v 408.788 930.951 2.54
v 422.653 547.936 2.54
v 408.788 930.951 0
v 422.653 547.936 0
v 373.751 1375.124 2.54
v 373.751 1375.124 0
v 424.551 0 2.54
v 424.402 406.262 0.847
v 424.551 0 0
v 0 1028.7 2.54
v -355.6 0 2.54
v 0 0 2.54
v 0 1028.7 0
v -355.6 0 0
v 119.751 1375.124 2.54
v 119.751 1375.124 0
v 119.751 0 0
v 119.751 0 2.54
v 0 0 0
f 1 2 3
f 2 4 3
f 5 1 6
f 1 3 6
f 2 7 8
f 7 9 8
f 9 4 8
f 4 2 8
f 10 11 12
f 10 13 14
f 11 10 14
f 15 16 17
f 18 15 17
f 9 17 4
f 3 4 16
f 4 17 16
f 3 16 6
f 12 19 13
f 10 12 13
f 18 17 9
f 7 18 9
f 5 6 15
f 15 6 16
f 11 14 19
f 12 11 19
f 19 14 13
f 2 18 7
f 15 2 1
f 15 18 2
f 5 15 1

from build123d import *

# Parameters (mm, degrees)
BOSS_EXTRUDE1_DEPTH   = 2.54
BOSS_EXTRUDE1_2_DEPTH = 2.54


with BuildPart() as part:
    # Sketch1 → Boss-Extrude1 (new body)
    with BuildSketch(Plane.XY):
        Polygon((0, 0), (0, 1028.7), (-355.6, 0), align=None)
    extrude(amount=BOSS_EXTRUDE1_DEPTH)


with BuildPart() as body_2:
    # Sketch1 → Boss-Extrude1 2 (new body)
    with BuildSketch(Plane.XY):
        with BuildLine():
            Line((373.751491802, 1375.123958426), (119.751491802, 1375.123958426))
            Line((119.751491802, 1375.123958426), (119.751491802, 0))
            Line((119.751491802, 0), (424.551491802, 0))
            add(Edge.make_bspline(
                [(424.551491802, 0), (424.57285643, 401.777203165), (432.304675958, 795.435328411), (373.751491802, 1375.123958426)],
                knots=[0, 0, 0, 0, 1, 1, 1, 1], degree=3))
        make_face()
    extrude(amount=BOSS_EXTRUDE1_2_DEPTH)


solid = Compound([part.part, body_2.part])
